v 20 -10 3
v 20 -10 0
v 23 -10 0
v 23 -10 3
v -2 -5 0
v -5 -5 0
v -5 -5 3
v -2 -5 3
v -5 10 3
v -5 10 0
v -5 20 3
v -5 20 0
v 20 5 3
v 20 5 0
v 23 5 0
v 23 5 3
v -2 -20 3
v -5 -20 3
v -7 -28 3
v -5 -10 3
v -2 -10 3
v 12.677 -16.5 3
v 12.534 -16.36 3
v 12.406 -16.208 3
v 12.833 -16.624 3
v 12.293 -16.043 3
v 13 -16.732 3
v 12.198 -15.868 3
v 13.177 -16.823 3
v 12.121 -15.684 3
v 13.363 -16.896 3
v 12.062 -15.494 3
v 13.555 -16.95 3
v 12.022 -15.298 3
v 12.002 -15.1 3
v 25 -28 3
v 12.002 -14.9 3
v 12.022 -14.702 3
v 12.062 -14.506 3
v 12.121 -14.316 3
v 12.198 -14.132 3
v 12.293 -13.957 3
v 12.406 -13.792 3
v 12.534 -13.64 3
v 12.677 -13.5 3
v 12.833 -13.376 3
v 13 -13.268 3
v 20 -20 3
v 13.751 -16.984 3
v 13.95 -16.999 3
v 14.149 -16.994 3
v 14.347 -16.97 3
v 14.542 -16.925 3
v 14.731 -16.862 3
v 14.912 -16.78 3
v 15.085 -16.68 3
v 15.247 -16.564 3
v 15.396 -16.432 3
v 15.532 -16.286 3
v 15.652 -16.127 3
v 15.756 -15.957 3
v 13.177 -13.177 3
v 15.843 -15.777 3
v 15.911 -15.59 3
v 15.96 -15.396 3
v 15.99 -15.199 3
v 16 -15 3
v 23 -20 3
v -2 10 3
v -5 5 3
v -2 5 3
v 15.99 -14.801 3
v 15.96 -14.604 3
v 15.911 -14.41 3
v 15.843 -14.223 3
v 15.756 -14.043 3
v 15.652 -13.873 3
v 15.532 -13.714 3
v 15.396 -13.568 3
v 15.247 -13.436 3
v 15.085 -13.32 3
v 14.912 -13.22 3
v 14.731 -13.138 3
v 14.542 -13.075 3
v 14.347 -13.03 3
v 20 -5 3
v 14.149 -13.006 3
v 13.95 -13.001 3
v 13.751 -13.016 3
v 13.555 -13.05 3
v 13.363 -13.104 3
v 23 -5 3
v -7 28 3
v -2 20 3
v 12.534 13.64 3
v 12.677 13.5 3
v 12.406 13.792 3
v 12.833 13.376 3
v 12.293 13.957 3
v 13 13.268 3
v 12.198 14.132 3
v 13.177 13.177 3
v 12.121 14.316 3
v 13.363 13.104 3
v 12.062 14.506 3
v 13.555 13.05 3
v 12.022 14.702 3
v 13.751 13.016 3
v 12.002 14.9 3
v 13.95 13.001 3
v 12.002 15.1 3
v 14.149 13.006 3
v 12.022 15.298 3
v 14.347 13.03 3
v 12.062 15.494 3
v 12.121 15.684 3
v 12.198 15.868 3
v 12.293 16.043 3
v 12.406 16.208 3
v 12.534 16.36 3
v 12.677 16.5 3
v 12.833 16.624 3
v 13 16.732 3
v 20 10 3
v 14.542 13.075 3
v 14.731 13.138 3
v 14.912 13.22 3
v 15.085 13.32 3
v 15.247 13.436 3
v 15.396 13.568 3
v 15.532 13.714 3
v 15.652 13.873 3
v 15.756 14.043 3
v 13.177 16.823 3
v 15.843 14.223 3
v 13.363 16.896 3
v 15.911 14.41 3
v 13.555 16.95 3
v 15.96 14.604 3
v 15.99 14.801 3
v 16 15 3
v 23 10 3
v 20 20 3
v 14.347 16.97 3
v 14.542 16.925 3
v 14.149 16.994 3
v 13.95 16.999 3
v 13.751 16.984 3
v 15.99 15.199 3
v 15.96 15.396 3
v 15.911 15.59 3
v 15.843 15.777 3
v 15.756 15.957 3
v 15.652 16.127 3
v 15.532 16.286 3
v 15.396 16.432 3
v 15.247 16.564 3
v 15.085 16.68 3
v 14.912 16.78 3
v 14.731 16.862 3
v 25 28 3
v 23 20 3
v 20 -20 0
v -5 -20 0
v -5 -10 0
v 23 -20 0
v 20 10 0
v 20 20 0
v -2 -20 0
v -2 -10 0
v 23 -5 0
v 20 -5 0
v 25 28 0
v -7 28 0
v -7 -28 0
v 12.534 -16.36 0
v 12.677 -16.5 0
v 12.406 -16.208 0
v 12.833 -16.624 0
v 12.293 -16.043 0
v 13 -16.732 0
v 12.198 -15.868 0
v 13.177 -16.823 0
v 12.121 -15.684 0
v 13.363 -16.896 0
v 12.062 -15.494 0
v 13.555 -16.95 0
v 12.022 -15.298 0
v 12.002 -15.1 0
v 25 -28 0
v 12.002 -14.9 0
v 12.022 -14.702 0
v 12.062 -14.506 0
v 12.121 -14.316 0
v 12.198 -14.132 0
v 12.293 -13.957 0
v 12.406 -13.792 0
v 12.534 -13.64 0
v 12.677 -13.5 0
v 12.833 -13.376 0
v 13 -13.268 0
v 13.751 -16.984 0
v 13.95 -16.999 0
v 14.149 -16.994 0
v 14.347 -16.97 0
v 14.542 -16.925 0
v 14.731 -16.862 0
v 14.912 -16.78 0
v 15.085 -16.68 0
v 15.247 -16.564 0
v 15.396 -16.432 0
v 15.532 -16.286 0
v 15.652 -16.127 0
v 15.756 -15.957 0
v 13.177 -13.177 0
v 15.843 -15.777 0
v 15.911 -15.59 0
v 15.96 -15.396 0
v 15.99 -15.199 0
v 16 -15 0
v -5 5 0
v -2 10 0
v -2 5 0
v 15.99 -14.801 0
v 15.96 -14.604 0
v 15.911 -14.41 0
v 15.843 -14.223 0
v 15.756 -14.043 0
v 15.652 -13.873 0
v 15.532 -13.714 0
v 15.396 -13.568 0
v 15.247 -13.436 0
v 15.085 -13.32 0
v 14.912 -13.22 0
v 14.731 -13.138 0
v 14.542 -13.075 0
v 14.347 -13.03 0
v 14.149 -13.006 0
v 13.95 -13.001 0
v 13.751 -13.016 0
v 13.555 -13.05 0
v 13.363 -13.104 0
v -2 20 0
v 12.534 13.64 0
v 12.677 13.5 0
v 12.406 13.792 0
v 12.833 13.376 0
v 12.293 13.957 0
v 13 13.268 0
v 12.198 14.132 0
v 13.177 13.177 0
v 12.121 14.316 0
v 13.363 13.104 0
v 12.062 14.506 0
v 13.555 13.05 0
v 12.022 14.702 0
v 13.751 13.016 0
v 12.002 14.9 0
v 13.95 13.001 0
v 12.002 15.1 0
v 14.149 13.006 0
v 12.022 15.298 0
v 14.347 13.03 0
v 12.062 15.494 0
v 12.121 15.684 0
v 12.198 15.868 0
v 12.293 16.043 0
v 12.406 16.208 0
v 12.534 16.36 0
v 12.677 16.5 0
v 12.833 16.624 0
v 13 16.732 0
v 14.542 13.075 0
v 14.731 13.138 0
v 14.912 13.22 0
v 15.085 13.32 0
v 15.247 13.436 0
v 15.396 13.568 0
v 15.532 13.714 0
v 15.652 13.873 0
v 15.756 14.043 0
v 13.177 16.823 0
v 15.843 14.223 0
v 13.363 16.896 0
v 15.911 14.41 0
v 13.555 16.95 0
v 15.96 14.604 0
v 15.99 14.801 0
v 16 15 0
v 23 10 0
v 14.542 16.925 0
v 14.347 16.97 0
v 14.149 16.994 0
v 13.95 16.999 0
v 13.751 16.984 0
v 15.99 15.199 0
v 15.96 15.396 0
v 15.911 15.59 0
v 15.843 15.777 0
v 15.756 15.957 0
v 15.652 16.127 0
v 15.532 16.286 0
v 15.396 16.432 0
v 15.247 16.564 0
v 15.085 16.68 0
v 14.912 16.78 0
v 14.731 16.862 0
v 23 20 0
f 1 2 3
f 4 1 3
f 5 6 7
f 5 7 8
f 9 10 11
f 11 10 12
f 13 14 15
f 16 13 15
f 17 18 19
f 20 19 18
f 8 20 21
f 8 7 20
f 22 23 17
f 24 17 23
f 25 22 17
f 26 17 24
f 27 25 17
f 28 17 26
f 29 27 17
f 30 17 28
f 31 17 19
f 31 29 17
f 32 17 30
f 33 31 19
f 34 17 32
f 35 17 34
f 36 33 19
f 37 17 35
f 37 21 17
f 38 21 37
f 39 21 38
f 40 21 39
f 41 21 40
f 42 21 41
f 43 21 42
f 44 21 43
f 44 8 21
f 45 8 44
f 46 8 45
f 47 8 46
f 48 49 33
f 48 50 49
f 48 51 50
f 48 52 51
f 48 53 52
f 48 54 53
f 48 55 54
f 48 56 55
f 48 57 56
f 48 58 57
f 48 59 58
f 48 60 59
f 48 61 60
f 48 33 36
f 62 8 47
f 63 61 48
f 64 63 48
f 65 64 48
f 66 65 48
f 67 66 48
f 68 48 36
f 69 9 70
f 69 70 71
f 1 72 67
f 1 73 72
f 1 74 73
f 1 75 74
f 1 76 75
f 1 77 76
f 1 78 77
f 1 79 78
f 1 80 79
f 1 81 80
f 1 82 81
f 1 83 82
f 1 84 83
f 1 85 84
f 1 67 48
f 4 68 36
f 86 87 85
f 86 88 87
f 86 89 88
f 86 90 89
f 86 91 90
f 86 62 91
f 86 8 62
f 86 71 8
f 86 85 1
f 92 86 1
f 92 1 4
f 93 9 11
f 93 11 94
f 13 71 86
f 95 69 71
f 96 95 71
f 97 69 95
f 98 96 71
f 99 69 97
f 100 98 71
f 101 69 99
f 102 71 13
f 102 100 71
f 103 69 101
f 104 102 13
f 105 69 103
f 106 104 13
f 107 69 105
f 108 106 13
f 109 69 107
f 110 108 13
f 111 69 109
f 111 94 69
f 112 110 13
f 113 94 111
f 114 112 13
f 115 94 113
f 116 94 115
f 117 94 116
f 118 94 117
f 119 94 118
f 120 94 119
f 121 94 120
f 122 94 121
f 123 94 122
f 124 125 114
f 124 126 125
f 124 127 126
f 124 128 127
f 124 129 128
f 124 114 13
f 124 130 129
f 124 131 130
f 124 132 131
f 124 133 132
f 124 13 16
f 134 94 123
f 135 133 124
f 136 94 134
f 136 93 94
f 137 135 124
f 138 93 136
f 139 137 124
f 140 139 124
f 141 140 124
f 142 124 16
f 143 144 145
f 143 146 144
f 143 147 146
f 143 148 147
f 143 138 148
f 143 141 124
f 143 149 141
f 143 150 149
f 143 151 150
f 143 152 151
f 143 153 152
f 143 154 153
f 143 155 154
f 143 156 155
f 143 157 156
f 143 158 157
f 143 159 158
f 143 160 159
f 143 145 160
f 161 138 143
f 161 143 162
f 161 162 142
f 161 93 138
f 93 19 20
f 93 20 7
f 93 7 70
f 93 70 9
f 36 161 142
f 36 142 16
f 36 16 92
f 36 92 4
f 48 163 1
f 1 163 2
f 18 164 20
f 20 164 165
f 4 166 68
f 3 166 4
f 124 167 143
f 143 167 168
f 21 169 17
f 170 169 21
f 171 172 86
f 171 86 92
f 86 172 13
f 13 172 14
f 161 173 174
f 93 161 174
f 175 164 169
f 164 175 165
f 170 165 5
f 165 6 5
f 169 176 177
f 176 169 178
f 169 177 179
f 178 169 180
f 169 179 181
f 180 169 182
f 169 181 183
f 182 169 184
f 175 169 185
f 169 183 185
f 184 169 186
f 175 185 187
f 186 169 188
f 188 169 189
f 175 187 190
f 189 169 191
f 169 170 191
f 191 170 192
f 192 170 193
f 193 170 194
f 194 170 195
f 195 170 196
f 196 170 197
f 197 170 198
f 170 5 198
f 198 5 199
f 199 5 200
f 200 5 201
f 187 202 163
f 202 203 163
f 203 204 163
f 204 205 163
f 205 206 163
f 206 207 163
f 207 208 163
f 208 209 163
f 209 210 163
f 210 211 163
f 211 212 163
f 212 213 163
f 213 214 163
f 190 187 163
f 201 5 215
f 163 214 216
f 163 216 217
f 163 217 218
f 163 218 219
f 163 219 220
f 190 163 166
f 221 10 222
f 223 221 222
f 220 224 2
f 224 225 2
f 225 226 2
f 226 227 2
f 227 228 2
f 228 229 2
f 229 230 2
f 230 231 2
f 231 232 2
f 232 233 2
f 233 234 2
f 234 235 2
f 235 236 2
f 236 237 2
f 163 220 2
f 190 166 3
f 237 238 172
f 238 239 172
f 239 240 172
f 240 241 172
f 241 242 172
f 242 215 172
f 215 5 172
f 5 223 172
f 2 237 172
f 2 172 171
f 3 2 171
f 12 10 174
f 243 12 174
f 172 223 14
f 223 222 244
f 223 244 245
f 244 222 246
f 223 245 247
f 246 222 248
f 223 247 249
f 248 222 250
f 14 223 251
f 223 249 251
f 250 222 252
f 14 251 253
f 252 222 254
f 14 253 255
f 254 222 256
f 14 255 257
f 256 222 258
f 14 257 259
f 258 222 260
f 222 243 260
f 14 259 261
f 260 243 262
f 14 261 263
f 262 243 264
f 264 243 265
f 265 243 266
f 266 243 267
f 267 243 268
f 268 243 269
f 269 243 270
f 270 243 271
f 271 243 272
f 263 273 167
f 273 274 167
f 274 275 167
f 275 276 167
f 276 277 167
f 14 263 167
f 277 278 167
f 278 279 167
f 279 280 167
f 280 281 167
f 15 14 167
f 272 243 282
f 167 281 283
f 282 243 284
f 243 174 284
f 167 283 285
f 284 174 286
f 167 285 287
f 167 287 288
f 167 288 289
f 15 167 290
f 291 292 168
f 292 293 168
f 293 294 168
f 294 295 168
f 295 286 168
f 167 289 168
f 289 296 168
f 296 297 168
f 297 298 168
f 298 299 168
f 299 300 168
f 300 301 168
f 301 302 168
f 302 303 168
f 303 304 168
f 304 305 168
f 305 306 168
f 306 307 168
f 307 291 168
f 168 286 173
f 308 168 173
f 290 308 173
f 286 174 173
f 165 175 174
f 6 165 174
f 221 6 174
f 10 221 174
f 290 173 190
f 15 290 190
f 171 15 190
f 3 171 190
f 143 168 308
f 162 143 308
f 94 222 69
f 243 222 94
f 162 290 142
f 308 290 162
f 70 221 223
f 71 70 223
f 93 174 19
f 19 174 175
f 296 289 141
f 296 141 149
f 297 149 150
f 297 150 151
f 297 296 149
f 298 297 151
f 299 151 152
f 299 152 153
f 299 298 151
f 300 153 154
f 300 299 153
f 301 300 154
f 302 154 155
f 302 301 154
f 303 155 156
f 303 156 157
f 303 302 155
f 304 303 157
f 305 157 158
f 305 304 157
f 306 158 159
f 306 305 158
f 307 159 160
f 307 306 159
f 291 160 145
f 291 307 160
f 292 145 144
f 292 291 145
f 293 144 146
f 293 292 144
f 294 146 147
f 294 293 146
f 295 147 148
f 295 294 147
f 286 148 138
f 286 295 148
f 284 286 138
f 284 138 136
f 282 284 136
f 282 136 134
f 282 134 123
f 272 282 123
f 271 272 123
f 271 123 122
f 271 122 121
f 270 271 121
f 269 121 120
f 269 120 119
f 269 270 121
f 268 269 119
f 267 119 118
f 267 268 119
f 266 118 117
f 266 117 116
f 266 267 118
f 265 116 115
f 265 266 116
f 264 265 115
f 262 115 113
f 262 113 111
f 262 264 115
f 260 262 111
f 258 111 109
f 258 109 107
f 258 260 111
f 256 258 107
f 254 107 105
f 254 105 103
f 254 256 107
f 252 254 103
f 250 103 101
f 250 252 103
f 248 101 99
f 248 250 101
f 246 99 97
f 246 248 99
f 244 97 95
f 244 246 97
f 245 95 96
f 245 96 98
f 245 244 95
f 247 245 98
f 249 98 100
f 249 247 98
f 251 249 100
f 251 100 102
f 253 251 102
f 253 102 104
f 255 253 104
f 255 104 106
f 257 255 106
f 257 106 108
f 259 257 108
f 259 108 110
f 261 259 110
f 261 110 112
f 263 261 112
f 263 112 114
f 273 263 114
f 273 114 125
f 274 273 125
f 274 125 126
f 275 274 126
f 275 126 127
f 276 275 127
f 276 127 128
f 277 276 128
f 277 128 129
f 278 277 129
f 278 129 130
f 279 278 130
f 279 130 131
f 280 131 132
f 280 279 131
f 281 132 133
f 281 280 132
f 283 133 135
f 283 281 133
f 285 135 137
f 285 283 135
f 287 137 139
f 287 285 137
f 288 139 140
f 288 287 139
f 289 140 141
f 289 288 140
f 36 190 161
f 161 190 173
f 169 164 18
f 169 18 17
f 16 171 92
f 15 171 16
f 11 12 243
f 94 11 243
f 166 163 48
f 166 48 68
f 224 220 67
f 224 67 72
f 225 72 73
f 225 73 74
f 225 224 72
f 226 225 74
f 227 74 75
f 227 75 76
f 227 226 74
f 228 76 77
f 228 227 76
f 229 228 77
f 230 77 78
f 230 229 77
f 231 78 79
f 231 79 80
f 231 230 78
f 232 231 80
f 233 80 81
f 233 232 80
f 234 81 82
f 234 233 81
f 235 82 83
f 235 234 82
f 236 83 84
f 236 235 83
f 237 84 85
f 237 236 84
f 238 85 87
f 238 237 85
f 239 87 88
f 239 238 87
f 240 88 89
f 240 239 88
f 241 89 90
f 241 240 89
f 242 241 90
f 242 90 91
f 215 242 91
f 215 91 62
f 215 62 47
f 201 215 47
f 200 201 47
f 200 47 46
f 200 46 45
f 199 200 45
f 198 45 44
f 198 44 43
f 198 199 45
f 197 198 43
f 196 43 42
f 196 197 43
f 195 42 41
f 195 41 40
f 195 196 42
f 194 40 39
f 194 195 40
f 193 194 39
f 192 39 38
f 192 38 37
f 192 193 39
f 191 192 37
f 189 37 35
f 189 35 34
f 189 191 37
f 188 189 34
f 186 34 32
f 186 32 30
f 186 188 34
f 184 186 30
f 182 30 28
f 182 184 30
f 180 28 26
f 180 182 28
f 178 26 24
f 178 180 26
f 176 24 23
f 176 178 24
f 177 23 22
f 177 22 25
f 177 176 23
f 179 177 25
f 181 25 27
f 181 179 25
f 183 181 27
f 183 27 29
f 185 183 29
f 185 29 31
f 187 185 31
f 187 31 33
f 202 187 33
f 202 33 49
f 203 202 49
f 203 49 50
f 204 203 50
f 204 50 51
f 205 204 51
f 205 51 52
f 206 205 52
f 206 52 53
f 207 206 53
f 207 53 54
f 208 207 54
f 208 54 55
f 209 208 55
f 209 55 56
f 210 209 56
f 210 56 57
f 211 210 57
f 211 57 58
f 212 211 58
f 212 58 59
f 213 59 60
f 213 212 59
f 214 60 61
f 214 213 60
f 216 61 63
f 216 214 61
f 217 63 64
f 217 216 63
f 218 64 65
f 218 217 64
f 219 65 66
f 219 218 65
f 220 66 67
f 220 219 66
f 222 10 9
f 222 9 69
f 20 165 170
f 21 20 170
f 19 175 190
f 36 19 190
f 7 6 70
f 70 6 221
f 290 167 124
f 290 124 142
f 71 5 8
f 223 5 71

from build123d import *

# Parameters (mm, degrees)
SKETCH_1_W      = 3
SKETCH_1_H      = 10
SKETCH_1_R      = 2
EXTRUDE_1_DEPTH = 3


with BuildPart() as part:
    # 草图1 → 凸台-拉伸1 (new body)
    with BuildSketch(Plane.XY):
        Polygon((25, -25), (25, 25), (25, 28), (-7, 28), (-7, 25), (-7, -25), (-7, -28), (25, -28), align=None)
        with Locations((-3.5, -15)):
            Rectangle(SKETCH_1_W, SKETCH_1_H, mode=Mode.SUBTRACT)
        with Locations((14, -15)):
            Circle(SKETCH_1_R, mode=Mode.SUBTRACT)
        with Locations((21.5, -15)):
            Rectangle(SKETCH_1_W, SKETCH_1_H, mode=Mode.SUBTRACT)
        with Locations((-3.5, 0)):
            Rectangle(SKETCH_1_W, SKETCH_1_H, mode=Mode.SUBTRACT)
        with Locations((-3.5, 15)):
            Rectangle(SKETCH_1_W, SKETCH_1_H, mode=Mode.SUBTRACT)
        with Locations((21.5, 0)):
            Rectangle(SKETCH_1_W, SKETCH_1_H, mode=Mode.SUBTRACT)
        with Locations((14, 15)):
            Circle(SKETCH_1_R, mode=Mode.SUBTRACT)
        with Locations((21.5, 15)):
            Rectangle(SKETCH_1_W, SKETCH_1_H, mode=Mode.SUBTRACT)
    extrude(amount=EXTRUDE_1_DEPTH)


solid = part.part
